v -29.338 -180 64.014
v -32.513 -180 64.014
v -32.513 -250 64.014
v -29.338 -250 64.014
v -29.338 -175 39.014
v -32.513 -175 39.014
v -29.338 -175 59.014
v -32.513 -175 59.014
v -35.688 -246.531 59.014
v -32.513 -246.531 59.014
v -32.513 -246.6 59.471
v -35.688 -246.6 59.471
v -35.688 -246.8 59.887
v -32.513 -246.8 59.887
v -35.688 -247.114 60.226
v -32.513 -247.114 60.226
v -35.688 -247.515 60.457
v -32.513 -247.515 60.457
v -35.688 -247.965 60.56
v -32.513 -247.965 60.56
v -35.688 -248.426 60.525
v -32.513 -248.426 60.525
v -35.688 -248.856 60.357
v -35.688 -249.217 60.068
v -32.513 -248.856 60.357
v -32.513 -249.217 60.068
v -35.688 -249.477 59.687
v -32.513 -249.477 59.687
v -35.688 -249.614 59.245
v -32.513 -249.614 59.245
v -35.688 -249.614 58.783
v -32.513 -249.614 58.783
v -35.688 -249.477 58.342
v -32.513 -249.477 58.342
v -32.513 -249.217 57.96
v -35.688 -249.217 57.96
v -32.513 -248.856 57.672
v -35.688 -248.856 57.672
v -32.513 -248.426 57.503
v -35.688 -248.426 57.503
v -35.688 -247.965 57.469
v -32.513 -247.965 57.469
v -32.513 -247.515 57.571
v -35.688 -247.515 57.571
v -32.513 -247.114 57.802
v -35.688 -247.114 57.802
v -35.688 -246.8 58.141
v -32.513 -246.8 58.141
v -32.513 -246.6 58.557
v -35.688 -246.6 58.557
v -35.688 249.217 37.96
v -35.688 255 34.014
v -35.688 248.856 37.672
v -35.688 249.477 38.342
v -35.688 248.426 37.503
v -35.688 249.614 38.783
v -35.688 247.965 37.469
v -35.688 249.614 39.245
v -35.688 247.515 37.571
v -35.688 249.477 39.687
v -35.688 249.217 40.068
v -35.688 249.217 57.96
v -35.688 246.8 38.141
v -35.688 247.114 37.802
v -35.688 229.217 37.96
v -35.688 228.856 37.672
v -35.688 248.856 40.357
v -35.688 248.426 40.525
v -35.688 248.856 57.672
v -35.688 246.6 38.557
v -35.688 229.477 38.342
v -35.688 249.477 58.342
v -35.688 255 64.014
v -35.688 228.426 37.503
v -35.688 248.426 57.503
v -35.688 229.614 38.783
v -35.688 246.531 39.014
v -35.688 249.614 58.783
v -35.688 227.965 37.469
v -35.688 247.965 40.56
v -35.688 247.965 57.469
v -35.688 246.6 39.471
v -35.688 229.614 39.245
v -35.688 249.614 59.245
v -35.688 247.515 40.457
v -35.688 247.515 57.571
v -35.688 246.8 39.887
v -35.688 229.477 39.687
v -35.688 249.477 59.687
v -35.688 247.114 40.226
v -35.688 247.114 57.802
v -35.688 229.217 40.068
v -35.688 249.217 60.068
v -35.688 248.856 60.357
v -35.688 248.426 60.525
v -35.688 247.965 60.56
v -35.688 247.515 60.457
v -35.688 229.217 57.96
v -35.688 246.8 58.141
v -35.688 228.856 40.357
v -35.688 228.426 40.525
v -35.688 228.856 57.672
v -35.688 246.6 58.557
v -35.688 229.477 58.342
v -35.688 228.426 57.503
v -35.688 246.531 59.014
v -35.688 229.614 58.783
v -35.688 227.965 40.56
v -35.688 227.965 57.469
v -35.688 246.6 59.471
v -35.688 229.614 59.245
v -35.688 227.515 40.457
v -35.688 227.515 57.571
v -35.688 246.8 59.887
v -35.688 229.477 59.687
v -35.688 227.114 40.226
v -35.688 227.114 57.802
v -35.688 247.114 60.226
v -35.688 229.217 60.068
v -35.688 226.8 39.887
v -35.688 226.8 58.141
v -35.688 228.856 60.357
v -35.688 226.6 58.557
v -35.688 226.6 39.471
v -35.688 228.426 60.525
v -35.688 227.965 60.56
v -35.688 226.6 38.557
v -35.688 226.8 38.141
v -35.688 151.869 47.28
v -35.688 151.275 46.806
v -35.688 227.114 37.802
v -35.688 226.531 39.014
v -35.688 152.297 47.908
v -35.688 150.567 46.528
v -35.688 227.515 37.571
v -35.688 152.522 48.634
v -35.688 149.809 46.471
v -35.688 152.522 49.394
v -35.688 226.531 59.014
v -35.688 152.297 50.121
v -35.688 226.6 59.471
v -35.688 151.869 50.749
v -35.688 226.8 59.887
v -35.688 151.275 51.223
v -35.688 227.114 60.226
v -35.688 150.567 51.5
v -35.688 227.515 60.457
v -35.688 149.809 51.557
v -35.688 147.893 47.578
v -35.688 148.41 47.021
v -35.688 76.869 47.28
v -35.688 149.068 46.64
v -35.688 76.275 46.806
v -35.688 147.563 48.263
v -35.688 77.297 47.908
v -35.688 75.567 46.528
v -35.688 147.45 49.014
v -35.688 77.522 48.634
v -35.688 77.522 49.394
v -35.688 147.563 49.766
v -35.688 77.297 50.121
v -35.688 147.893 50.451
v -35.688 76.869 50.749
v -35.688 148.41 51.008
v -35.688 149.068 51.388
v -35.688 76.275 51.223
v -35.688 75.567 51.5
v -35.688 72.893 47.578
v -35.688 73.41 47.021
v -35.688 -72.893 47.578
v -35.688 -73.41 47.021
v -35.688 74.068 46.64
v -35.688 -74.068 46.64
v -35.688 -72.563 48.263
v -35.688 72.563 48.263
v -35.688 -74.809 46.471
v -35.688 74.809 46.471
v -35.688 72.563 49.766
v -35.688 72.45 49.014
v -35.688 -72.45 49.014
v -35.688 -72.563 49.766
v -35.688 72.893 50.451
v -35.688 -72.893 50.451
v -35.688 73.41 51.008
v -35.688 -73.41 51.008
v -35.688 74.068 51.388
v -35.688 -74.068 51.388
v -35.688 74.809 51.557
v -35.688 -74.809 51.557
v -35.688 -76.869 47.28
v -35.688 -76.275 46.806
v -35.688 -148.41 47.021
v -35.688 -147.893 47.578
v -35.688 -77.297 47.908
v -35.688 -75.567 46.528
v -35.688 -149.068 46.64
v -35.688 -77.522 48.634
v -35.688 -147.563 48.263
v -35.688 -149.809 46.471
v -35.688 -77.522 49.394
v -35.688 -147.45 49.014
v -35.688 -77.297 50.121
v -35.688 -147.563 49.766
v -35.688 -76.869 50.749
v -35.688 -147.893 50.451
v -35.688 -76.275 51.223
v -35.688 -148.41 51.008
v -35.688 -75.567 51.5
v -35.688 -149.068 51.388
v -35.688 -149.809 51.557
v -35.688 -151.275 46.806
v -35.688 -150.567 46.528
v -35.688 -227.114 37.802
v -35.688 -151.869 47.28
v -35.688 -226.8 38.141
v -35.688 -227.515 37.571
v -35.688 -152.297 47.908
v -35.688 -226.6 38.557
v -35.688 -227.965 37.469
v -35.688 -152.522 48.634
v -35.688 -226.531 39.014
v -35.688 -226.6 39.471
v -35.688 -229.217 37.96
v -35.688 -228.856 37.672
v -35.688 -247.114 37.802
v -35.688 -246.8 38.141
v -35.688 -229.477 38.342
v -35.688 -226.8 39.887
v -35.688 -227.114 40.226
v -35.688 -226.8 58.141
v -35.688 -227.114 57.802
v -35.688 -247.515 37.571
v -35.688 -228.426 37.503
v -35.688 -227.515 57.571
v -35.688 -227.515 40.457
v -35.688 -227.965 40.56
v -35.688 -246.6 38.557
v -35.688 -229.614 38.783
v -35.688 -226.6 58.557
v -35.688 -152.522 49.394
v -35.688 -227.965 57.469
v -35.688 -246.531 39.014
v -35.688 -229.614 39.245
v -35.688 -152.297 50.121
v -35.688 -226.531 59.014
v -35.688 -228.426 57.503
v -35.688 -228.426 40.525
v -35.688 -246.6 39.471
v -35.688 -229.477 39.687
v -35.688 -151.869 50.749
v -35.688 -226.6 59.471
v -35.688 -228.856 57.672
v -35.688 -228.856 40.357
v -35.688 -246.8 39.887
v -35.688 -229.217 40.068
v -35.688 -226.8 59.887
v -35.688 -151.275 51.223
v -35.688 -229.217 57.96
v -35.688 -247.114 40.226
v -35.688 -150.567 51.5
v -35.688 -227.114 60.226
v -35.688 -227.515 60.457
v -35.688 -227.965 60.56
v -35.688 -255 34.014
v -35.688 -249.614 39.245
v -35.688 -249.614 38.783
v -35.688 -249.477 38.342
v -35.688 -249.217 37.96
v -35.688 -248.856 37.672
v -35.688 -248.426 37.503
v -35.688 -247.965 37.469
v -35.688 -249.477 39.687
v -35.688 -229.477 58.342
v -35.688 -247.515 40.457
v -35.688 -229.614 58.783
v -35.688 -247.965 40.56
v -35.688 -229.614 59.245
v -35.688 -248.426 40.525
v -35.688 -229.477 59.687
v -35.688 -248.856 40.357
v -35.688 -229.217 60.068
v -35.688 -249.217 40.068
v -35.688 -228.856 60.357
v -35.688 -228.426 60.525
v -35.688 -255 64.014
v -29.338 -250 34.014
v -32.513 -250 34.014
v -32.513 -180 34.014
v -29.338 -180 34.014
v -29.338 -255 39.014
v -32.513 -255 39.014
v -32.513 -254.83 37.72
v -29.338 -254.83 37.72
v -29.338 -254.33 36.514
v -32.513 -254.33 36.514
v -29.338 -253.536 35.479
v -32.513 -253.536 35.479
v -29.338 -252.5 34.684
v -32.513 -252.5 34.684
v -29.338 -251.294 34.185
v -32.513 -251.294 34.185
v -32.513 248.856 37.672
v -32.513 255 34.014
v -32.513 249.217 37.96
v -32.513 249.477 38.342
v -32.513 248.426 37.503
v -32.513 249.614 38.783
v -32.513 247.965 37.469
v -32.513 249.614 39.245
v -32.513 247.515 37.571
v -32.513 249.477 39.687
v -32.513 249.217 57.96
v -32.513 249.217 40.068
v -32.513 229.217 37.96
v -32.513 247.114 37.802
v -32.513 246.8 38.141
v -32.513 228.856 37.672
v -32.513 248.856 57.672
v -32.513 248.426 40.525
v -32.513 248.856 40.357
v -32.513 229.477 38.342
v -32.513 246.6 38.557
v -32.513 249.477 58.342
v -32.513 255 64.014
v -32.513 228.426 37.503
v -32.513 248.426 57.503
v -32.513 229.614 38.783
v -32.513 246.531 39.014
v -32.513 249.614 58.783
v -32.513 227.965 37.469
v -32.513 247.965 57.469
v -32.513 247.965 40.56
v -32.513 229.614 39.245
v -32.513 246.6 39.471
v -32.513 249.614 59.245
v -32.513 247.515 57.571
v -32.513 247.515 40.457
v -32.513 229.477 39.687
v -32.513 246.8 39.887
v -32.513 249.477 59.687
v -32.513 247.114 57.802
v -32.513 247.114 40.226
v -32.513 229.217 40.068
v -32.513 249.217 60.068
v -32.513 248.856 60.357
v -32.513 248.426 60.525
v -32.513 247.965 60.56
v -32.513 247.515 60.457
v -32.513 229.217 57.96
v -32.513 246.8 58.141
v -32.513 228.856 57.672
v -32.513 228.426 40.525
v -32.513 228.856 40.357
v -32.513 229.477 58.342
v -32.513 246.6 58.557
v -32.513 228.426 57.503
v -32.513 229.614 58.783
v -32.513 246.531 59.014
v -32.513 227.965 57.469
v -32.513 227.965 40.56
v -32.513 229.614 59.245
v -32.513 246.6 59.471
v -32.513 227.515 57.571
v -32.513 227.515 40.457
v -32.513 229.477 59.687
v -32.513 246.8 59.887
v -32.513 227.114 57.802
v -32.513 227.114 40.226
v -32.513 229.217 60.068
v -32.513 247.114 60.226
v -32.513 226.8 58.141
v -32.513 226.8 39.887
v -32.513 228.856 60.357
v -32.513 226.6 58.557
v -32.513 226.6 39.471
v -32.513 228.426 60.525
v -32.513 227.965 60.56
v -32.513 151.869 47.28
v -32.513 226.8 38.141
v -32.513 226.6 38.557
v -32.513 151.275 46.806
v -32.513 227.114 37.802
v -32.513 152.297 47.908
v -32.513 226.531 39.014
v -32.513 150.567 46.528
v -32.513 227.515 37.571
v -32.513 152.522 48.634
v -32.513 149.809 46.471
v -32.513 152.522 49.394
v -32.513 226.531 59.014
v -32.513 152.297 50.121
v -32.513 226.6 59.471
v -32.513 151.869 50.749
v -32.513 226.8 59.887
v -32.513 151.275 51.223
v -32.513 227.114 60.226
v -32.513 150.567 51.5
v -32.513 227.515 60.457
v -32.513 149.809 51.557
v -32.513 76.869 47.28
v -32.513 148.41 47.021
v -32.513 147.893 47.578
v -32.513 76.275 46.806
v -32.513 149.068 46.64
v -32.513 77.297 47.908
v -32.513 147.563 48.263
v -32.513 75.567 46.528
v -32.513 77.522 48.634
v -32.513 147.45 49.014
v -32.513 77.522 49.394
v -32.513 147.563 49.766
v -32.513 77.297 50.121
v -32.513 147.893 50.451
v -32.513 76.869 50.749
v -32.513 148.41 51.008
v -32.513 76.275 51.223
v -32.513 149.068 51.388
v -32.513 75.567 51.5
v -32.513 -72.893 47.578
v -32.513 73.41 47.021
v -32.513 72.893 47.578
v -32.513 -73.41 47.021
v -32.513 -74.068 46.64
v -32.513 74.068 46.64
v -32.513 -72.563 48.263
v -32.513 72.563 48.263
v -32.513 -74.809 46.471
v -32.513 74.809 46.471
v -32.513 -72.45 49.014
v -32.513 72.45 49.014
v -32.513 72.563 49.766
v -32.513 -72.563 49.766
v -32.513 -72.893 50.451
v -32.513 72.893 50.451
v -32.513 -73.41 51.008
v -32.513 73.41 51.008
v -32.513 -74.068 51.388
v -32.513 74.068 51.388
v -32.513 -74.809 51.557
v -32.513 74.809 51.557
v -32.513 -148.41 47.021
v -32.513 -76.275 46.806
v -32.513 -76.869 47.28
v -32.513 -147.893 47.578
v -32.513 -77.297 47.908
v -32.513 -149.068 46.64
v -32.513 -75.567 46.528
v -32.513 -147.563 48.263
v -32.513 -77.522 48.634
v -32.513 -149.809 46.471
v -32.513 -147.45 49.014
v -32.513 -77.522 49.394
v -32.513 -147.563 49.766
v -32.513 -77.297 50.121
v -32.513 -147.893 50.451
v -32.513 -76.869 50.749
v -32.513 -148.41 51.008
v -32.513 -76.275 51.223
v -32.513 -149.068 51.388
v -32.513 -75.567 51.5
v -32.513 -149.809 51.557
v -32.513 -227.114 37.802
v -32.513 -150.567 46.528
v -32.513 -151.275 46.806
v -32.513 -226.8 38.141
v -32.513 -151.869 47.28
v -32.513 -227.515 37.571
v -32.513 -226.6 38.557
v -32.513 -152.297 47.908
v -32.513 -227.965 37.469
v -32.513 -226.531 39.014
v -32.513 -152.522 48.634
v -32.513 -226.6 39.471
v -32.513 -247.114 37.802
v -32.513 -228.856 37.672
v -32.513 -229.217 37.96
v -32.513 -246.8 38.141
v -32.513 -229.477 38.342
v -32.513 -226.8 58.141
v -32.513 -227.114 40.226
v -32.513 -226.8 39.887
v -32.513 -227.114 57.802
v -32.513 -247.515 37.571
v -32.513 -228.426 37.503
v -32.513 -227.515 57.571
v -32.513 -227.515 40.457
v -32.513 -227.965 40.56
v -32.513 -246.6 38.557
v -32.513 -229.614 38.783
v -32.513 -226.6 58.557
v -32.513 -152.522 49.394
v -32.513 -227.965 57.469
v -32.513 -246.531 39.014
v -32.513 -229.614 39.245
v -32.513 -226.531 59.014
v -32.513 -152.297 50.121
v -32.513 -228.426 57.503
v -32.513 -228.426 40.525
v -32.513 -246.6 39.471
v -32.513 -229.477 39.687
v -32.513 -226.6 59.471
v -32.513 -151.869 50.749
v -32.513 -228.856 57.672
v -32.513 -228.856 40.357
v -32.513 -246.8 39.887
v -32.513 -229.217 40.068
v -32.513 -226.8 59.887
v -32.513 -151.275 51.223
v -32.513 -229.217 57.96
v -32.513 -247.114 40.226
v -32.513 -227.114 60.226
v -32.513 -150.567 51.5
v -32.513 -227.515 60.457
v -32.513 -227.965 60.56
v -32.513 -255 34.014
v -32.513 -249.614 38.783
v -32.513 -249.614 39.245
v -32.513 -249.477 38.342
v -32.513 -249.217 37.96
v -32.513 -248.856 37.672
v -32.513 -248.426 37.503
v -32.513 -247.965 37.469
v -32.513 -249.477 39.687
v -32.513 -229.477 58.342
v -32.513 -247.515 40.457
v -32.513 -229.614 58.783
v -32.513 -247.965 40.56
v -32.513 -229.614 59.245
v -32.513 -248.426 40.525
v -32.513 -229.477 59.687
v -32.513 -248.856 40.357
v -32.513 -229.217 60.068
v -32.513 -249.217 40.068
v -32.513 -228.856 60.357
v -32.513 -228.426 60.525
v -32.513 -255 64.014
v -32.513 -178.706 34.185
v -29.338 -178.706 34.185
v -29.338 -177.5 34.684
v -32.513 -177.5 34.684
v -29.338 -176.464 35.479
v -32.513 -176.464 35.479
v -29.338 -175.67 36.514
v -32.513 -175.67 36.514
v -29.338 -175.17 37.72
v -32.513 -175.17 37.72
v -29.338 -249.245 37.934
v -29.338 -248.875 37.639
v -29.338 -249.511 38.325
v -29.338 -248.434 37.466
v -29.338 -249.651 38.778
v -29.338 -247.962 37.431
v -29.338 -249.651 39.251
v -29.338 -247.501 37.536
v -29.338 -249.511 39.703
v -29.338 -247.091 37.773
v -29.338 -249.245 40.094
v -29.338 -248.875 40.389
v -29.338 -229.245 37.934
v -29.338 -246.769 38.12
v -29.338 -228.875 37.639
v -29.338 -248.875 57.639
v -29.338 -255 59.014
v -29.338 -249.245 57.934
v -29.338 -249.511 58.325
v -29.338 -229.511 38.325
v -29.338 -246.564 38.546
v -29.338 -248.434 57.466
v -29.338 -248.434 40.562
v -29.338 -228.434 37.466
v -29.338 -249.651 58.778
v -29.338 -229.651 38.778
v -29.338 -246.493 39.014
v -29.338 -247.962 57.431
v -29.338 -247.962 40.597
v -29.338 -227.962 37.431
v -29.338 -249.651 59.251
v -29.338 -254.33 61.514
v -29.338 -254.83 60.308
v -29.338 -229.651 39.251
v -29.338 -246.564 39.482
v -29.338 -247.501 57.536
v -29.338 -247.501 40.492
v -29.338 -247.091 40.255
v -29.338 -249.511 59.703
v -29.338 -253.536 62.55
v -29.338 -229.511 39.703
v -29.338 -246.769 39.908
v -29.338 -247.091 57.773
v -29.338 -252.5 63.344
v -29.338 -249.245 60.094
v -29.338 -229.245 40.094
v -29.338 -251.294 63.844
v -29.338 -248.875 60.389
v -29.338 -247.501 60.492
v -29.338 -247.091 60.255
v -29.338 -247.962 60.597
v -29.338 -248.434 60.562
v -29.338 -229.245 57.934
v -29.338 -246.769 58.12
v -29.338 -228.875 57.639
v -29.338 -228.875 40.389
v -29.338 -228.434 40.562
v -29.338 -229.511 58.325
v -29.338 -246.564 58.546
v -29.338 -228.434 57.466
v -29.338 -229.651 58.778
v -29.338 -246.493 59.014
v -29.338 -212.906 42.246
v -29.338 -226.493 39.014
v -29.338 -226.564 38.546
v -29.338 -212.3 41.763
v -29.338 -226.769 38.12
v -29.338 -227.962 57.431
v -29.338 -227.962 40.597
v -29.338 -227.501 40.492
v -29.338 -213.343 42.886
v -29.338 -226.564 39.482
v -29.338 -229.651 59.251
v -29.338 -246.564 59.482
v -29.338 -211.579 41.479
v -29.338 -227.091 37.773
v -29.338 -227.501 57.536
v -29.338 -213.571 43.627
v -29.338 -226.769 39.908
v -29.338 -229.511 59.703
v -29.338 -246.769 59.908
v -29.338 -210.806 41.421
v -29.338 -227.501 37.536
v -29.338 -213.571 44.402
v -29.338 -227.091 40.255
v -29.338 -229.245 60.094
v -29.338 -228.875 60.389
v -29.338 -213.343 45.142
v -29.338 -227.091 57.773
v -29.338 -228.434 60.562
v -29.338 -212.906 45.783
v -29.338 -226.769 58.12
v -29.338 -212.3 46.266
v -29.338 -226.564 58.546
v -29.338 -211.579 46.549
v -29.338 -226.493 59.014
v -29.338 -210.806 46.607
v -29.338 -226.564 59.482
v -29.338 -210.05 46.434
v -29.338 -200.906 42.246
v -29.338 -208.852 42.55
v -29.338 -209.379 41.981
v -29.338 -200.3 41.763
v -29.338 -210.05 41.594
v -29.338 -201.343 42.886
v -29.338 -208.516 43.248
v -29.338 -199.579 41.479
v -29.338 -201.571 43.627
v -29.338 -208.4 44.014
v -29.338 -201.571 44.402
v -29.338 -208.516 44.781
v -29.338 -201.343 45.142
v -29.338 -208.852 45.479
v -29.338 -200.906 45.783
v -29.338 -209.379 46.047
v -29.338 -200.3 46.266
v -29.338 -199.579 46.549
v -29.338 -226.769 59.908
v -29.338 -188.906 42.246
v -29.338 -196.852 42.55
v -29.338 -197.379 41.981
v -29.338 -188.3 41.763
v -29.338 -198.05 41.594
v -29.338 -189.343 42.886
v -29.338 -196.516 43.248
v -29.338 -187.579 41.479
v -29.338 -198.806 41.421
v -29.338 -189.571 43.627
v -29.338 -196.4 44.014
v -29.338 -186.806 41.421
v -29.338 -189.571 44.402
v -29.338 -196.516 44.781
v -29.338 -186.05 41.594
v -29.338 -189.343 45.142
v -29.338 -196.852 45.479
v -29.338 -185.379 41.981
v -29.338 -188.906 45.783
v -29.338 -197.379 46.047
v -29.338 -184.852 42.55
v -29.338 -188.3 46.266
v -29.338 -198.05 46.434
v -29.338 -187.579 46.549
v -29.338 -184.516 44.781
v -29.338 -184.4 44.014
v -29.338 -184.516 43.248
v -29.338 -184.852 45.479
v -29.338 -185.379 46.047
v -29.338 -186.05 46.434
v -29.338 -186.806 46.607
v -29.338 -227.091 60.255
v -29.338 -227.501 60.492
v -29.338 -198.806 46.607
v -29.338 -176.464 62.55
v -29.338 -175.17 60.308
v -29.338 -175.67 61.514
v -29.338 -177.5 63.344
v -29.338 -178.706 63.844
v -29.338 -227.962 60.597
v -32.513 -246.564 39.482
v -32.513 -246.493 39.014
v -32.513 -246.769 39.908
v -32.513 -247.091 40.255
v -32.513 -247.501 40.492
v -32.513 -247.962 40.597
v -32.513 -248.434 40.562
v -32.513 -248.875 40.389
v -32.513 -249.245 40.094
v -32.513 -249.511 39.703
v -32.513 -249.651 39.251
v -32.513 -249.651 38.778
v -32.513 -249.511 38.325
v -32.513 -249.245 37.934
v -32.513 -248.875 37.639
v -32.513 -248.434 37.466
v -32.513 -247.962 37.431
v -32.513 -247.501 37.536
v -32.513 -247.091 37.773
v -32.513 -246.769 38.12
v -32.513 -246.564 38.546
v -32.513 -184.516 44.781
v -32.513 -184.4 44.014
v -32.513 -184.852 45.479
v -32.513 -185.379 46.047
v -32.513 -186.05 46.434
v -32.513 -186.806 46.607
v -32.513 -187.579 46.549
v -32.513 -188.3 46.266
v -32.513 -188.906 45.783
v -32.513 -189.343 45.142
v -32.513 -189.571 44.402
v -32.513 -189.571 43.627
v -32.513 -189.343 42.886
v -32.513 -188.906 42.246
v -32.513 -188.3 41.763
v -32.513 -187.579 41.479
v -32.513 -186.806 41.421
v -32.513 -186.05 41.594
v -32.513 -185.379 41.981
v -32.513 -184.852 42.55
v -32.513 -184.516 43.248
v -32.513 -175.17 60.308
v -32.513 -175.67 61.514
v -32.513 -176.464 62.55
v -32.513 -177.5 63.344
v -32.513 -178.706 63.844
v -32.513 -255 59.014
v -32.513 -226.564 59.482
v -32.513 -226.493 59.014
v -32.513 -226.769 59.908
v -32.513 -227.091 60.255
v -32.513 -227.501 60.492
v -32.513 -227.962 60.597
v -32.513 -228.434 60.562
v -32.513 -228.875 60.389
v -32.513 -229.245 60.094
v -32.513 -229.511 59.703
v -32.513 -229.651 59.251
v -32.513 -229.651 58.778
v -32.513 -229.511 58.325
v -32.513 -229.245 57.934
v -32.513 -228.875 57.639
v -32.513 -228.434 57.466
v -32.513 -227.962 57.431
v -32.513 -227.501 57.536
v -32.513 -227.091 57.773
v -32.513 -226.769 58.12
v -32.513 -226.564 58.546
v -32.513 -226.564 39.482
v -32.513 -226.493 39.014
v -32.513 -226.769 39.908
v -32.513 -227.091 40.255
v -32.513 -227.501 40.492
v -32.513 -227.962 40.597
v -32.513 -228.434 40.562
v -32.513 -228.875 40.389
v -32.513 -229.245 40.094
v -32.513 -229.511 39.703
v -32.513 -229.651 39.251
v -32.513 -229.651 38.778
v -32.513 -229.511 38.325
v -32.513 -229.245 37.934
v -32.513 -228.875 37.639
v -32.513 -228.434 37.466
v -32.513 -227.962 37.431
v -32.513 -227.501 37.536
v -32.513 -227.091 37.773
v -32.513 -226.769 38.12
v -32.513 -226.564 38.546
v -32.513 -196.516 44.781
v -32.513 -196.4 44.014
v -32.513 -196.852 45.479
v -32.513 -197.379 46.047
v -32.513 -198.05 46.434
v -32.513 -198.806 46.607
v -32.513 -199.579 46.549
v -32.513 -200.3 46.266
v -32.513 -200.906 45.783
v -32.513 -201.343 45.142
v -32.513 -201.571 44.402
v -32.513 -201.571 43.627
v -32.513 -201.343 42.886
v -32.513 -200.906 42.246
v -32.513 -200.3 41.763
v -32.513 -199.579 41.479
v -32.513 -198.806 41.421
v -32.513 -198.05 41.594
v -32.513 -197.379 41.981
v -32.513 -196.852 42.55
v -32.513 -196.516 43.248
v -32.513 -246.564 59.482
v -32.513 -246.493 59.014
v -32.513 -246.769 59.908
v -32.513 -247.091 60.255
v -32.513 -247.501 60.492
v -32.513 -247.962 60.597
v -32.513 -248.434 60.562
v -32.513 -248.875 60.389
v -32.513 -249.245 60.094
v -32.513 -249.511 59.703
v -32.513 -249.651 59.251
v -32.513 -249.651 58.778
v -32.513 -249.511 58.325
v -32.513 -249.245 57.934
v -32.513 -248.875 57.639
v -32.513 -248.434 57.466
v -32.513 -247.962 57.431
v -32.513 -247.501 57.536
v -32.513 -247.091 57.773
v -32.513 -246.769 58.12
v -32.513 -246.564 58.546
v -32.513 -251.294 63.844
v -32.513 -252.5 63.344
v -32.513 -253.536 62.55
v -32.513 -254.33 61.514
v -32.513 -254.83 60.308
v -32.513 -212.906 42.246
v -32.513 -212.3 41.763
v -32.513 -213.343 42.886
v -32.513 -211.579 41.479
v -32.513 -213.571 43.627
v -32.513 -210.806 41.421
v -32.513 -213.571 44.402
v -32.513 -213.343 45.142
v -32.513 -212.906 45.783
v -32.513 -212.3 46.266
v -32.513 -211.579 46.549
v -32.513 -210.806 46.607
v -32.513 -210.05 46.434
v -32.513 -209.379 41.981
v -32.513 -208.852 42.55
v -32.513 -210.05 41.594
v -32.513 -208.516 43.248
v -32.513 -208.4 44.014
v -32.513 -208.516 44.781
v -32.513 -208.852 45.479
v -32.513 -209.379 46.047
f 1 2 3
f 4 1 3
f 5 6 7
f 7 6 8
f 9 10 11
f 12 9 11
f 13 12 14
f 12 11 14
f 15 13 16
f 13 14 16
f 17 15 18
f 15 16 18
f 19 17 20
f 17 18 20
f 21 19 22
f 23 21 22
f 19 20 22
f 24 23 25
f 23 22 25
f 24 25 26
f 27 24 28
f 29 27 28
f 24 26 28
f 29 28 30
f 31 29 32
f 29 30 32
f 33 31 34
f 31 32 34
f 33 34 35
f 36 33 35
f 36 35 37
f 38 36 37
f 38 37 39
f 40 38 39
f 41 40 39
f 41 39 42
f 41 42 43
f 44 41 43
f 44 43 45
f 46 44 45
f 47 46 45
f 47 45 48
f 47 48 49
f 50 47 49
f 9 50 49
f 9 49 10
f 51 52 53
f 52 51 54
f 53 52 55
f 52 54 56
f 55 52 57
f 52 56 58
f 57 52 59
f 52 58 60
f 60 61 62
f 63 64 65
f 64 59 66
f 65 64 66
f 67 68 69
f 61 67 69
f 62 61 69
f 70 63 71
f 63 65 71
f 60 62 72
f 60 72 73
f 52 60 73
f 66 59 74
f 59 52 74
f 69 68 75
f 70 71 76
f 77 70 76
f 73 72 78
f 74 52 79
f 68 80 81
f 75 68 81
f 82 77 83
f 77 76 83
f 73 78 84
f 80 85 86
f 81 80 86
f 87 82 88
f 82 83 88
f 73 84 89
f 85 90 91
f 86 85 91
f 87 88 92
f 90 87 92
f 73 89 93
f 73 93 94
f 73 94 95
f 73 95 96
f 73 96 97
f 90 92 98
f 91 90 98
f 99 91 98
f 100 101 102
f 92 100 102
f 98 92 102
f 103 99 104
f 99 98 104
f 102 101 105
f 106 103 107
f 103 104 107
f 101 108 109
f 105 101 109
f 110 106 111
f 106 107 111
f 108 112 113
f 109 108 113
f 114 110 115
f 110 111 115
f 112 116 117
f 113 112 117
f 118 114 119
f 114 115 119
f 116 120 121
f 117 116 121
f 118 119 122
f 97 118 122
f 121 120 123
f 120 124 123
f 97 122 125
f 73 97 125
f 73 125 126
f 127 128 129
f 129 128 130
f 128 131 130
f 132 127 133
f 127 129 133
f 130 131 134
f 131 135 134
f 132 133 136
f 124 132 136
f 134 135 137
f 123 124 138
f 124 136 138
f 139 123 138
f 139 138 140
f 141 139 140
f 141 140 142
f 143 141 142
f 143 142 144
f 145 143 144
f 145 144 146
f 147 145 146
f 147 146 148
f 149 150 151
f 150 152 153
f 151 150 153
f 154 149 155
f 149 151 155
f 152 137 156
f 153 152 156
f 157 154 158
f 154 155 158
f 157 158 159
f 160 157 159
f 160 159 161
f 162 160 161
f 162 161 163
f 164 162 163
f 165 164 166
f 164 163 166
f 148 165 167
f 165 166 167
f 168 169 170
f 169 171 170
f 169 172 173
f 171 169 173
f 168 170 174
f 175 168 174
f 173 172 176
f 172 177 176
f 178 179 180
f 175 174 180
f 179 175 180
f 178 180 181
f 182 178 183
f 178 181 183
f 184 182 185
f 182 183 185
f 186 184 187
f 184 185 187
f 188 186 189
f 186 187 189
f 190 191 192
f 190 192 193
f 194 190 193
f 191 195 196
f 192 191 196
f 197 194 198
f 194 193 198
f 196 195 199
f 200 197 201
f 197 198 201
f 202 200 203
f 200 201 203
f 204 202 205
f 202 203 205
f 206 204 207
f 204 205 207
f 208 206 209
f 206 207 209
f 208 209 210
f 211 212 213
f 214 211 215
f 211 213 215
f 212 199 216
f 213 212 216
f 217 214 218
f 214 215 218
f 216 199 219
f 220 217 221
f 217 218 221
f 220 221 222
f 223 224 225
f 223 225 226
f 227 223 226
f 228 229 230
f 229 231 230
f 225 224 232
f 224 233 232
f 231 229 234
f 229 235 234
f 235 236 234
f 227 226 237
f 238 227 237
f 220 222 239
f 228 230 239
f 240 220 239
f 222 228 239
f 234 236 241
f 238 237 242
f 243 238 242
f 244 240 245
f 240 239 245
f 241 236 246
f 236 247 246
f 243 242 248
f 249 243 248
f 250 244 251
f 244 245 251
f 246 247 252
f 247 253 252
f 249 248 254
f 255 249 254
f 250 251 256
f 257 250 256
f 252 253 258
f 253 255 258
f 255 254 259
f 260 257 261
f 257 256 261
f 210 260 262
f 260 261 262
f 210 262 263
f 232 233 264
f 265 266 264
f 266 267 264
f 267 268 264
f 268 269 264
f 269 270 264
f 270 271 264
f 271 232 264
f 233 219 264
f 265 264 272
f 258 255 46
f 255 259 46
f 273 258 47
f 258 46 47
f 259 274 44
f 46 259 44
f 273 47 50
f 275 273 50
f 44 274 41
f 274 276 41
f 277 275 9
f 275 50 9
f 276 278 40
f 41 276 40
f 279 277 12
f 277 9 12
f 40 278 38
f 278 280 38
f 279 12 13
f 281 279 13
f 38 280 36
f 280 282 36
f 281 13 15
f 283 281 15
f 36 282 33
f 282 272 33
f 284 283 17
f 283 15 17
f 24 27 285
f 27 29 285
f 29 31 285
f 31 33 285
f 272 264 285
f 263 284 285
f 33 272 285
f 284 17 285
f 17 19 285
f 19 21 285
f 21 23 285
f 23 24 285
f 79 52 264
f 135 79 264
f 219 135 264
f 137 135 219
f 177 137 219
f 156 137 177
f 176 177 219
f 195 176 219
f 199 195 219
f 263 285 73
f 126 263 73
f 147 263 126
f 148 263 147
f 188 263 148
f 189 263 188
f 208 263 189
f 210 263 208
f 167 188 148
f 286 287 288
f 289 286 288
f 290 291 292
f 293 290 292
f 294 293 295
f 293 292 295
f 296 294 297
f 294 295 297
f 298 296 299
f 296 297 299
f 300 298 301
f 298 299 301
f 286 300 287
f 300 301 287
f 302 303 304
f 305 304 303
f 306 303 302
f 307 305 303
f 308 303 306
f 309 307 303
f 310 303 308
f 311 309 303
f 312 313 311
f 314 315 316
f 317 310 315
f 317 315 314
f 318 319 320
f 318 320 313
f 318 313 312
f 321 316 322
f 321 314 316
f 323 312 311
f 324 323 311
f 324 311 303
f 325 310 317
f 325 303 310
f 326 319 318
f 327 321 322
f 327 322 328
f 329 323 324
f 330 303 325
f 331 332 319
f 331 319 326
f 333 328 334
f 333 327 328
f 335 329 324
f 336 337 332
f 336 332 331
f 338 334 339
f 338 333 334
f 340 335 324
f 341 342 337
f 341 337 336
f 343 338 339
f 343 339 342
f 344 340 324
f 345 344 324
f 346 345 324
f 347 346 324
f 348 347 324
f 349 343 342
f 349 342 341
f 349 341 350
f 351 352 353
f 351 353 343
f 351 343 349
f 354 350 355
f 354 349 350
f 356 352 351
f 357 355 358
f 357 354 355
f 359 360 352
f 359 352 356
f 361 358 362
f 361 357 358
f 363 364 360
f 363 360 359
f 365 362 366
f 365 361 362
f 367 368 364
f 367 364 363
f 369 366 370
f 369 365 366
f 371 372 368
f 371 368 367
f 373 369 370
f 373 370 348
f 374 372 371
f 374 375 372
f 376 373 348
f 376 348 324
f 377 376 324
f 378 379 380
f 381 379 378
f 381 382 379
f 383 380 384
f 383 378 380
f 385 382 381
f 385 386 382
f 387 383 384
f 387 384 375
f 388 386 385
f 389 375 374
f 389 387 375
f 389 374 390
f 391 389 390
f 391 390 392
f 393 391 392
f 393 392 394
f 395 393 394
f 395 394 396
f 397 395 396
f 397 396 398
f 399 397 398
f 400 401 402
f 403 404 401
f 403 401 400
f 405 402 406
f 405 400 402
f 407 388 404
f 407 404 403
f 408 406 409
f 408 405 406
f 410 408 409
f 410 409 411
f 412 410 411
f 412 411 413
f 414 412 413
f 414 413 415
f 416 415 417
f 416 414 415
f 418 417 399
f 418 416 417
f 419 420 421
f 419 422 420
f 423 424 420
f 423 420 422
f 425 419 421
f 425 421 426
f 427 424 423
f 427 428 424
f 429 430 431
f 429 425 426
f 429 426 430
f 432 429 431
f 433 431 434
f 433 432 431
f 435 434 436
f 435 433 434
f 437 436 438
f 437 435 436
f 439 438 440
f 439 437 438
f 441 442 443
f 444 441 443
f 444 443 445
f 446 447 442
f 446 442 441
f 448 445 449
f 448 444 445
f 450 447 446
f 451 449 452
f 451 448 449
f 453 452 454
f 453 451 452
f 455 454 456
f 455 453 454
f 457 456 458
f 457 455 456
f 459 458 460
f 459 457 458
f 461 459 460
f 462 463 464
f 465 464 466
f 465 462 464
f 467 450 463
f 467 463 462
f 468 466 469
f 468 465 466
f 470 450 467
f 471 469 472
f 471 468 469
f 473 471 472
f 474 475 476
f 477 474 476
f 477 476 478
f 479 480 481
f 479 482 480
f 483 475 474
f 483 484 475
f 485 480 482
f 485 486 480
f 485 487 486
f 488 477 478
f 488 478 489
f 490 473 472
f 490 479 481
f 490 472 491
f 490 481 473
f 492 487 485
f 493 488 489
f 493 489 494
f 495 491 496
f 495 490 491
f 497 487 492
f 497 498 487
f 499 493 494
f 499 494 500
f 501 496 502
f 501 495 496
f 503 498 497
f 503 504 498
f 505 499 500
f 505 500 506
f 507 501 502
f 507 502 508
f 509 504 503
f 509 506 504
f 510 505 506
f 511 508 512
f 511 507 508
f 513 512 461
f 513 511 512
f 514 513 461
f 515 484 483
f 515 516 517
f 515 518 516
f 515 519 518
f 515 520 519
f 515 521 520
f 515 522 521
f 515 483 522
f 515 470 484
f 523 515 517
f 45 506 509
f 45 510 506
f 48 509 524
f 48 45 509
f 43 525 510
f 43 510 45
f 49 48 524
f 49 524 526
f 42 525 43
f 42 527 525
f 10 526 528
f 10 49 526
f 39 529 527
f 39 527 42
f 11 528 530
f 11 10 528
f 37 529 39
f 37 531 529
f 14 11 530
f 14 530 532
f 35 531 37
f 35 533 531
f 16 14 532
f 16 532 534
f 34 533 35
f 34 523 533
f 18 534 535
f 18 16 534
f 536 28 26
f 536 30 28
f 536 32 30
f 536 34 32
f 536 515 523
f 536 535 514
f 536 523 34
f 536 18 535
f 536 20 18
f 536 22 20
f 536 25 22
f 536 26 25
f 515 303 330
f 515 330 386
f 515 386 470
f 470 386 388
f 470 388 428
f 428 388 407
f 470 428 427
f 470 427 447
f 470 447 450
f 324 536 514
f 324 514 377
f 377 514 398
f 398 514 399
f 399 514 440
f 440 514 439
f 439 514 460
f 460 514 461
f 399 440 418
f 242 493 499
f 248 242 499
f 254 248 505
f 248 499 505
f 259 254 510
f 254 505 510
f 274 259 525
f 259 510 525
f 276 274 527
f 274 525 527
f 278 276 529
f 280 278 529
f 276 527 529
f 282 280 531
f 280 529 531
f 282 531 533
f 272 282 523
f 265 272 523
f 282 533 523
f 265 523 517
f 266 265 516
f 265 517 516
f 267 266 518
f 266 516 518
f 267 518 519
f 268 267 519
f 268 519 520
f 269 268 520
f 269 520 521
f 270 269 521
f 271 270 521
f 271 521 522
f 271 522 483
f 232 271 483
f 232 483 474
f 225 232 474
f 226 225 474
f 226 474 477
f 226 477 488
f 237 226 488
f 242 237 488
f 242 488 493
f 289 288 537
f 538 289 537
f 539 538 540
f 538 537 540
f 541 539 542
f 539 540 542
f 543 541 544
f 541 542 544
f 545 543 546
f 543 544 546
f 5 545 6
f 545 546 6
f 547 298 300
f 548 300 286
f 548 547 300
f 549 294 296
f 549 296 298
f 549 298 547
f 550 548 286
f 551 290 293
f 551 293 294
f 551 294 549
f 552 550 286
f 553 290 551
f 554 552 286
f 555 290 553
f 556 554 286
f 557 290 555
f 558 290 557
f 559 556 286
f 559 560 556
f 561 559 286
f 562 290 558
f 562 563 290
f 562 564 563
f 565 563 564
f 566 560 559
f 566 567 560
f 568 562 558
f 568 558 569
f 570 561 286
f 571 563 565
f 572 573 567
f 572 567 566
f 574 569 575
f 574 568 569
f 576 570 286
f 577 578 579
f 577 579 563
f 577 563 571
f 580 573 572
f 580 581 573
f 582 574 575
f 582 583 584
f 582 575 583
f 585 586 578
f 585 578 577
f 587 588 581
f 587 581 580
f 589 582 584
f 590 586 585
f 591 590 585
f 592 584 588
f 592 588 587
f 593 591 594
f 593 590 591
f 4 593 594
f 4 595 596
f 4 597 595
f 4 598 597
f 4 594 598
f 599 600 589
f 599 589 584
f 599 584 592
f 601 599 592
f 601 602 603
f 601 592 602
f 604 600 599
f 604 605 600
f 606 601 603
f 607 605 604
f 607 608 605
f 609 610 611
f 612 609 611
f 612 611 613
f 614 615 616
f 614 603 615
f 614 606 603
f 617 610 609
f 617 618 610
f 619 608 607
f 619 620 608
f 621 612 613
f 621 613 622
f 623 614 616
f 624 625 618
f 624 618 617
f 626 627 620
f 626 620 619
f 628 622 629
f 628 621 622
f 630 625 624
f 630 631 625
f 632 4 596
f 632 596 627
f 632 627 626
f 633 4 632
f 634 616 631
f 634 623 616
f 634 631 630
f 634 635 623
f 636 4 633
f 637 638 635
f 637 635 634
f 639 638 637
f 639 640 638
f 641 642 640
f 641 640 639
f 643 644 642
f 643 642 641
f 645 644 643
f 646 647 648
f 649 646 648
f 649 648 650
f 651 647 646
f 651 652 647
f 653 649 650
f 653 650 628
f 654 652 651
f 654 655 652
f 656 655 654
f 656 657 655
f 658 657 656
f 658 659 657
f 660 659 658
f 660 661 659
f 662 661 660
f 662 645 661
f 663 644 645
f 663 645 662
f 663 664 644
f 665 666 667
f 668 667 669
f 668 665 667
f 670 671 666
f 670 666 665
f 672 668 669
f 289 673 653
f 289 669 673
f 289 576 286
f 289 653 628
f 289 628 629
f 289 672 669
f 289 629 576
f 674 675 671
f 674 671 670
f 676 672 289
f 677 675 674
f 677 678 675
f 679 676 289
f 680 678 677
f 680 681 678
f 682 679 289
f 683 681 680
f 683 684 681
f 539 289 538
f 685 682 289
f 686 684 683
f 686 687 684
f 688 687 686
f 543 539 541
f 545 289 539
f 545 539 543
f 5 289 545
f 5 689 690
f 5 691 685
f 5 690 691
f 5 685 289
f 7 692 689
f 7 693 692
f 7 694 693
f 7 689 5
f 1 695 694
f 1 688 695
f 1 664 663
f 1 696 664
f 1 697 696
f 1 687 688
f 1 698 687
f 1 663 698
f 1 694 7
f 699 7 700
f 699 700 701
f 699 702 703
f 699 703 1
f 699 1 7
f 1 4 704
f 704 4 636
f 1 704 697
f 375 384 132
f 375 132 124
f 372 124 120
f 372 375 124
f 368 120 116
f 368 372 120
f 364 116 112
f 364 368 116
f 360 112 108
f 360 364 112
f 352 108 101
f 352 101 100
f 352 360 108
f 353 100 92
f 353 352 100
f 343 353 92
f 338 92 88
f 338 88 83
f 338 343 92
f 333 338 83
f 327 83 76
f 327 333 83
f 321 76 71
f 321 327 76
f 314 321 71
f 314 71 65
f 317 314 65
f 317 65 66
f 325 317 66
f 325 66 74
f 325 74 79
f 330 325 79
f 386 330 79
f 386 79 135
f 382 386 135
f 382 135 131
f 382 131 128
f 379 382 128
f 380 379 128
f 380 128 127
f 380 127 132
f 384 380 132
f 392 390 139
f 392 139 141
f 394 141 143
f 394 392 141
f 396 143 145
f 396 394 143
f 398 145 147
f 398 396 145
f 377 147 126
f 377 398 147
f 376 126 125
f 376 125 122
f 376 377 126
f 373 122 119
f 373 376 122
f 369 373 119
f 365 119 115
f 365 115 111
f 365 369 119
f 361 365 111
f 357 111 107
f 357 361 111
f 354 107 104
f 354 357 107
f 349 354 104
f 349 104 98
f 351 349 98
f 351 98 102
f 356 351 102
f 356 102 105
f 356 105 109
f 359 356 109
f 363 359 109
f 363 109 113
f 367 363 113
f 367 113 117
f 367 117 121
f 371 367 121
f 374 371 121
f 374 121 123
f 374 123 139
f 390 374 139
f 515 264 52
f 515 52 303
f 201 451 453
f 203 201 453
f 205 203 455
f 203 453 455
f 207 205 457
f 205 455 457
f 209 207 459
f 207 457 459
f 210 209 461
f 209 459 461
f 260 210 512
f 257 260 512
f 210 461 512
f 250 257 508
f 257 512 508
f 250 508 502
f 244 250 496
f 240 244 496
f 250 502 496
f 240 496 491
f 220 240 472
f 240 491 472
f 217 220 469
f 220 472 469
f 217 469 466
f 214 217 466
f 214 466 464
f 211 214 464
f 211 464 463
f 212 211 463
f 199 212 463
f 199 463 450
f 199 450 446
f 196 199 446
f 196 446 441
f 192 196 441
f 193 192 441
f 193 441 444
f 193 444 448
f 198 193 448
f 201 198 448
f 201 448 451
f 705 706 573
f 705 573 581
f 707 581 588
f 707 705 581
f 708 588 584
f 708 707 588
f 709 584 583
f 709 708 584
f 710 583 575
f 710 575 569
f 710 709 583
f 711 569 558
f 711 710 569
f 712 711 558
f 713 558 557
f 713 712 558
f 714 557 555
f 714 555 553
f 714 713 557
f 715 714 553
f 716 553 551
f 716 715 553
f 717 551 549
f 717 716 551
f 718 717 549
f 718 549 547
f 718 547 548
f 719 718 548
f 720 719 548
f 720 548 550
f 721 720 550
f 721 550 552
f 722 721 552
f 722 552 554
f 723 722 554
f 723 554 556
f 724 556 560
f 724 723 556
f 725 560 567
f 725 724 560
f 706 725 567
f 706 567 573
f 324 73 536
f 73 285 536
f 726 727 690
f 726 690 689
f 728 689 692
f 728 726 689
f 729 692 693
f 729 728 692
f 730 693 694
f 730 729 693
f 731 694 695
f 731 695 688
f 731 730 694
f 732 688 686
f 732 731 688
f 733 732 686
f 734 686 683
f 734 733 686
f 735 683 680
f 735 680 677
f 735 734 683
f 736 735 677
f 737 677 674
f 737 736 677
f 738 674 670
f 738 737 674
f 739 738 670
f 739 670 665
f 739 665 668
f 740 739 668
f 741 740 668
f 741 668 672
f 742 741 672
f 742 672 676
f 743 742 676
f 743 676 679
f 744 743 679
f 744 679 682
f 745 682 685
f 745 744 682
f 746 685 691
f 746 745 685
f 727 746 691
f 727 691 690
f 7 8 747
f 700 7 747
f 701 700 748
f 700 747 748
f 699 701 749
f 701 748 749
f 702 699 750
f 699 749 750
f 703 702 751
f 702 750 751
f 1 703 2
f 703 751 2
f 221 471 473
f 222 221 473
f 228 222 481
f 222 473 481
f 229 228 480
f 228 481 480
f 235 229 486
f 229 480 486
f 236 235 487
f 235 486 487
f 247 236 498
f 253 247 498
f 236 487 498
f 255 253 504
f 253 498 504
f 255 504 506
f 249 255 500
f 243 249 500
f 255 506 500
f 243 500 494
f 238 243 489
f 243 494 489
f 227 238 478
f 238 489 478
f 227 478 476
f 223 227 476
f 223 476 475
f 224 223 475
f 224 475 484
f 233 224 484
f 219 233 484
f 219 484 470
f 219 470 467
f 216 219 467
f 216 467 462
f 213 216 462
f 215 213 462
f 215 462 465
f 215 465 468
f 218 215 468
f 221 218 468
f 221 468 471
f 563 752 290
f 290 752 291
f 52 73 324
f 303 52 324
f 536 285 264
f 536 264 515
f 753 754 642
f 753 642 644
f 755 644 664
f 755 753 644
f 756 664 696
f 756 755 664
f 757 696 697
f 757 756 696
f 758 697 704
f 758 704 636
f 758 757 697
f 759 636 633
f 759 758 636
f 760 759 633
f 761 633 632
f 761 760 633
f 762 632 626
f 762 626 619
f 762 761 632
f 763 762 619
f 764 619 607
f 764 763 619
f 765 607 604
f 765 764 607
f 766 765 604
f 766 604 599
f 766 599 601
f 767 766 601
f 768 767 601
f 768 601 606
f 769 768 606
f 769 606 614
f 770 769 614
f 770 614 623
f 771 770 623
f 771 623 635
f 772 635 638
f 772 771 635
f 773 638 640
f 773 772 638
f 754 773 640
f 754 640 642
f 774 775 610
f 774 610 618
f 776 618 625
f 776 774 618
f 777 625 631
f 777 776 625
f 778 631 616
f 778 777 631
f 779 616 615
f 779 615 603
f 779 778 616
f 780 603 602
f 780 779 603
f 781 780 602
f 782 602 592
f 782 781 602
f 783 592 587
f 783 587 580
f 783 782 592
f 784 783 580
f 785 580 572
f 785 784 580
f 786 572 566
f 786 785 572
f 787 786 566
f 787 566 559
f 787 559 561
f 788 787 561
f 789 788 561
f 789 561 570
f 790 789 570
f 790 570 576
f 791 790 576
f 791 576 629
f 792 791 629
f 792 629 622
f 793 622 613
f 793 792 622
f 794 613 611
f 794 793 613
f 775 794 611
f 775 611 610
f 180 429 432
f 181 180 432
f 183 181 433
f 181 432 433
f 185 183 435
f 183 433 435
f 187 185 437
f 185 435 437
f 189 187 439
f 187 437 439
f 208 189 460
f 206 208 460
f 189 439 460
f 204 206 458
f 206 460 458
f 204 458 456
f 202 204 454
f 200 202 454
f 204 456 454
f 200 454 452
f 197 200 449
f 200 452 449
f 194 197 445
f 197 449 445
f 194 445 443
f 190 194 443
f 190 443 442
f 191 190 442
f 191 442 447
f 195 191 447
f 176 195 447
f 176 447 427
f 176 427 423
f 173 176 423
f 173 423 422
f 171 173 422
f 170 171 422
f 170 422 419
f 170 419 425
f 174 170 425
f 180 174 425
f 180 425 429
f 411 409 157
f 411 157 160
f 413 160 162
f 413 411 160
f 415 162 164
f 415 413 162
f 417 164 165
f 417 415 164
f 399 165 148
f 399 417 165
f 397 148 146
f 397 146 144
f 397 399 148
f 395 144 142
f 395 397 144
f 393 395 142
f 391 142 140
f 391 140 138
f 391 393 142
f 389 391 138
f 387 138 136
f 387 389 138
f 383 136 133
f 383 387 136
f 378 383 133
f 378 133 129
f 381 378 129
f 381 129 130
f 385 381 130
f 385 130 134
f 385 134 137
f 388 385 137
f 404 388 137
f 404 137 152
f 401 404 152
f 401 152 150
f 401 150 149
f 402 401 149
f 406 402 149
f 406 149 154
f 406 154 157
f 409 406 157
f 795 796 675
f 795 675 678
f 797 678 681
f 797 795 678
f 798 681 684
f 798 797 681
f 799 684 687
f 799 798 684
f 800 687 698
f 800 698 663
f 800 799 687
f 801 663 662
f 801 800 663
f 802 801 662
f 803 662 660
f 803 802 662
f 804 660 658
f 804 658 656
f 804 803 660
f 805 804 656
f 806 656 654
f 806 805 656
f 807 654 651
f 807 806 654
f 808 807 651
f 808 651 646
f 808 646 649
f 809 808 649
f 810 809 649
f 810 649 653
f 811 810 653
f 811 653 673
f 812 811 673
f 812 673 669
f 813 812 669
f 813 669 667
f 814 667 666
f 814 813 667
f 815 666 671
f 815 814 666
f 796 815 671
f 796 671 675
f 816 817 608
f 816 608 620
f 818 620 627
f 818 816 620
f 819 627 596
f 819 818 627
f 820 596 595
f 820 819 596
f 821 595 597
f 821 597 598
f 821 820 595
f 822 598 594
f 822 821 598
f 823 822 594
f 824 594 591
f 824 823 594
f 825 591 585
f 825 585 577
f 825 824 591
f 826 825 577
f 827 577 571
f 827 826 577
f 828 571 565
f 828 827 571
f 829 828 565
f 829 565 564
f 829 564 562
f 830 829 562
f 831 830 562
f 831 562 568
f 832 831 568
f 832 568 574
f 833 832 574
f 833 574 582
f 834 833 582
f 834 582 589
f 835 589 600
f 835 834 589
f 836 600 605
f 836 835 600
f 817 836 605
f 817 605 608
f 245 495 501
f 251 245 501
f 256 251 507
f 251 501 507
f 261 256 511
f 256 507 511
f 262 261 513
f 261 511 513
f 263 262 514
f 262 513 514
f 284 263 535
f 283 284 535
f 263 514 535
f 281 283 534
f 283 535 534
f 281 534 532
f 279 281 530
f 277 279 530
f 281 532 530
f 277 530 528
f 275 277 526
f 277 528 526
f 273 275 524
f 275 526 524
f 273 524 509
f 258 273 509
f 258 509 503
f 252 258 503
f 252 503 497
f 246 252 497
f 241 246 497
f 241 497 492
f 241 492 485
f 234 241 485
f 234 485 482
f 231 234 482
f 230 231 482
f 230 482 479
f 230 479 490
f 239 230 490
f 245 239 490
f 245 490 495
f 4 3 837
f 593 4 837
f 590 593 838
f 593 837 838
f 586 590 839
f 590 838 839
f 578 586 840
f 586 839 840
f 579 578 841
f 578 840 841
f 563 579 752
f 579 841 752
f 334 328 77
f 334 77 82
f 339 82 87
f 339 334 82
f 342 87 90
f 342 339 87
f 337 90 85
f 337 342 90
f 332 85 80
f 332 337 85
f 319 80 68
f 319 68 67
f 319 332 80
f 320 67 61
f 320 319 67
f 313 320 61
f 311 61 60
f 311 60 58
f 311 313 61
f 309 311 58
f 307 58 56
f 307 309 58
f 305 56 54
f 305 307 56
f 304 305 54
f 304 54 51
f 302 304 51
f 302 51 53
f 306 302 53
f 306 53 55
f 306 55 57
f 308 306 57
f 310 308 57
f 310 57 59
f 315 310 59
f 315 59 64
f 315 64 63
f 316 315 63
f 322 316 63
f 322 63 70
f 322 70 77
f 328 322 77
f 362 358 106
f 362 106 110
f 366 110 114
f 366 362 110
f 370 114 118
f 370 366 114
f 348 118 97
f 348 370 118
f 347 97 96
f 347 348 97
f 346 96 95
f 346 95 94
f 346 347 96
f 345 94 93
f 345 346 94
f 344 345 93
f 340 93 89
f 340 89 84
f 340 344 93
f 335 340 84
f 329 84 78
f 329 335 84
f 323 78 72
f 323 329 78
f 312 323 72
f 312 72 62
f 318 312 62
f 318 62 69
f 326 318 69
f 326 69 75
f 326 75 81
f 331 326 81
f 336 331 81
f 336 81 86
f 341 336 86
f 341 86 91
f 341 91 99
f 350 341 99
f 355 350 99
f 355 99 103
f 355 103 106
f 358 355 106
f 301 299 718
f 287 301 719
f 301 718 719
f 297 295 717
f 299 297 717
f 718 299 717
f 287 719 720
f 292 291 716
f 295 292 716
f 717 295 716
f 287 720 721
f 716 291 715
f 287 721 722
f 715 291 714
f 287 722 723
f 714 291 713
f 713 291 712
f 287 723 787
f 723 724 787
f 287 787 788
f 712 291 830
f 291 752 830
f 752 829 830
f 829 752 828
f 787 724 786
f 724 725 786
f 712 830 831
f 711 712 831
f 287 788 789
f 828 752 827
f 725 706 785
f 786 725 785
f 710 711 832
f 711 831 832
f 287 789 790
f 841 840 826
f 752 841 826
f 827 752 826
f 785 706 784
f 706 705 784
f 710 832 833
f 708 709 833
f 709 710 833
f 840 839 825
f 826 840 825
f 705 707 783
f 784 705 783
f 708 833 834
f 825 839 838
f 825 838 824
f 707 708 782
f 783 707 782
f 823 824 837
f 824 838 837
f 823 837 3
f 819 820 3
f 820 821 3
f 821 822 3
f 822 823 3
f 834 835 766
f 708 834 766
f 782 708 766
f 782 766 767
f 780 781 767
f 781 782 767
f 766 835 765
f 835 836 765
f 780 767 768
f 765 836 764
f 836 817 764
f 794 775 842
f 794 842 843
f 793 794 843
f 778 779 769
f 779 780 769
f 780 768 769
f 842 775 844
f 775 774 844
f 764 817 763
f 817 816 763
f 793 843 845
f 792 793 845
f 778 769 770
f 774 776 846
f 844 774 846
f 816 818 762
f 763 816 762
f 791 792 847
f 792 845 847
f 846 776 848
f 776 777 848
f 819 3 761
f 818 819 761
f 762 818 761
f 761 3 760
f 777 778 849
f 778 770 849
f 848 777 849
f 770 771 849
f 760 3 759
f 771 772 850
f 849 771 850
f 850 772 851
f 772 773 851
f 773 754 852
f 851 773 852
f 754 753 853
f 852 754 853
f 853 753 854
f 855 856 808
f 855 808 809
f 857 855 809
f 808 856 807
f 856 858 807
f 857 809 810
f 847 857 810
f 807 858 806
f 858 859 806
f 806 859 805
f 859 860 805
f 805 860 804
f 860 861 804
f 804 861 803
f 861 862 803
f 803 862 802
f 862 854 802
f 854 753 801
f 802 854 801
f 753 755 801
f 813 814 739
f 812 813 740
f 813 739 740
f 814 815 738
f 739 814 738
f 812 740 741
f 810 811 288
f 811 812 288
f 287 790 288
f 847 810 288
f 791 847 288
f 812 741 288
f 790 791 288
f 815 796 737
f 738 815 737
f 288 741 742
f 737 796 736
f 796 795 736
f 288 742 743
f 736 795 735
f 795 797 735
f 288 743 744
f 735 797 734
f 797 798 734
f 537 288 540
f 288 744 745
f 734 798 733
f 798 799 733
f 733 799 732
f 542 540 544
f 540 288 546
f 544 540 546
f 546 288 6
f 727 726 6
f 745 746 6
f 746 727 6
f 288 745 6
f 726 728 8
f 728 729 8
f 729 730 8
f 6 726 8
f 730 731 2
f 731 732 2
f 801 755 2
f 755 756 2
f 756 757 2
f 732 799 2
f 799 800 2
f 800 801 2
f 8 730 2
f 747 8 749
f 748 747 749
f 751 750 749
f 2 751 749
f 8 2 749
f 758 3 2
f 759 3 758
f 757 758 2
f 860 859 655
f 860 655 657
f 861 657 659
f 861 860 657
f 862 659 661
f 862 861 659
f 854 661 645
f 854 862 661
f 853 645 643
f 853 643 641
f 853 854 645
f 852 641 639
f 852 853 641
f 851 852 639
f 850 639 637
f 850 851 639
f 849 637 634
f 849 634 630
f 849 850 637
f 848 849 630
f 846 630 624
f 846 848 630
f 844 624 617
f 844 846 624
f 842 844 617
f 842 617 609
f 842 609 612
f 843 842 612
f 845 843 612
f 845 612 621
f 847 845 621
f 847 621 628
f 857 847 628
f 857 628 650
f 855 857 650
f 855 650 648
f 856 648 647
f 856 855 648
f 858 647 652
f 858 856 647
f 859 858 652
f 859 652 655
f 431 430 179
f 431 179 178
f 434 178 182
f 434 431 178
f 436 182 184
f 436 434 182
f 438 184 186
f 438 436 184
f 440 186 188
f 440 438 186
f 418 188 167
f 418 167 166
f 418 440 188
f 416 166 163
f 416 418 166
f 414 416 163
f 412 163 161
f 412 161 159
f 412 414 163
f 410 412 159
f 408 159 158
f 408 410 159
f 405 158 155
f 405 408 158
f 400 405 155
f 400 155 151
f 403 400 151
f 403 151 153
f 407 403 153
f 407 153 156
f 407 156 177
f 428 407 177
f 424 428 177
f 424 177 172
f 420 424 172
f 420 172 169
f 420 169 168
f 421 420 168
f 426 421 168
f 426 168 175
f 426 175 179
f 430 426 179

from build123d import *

# Parameters (mm, degrees)
F0_W     = 3.175
F0_H     = 30
F1_DEPTH = 255
F2_R     = 1.55
F2_R_2   = 2.55
F3_DEPTH = 25
F5_R     = 1.5875
F5_R_2   = 2.6
F6_DEPTH = 3.175


with BuildPart() as f1:
    # F0 (on Front) → F1 (new body)
    with BuildSketch(Plane.XZ):
        with Locations((-34.100204, 49.014178)):
            Rectangle(F0_W, F0_H)
    extrude(amount=F1_DEPTH)

    # F2 (on face) → F3 (cut)
    with BuildSketch(Plane.YZ.offset(-32.512704)):
        with Locations((-248.080885, 59.014178)):
            Circle(F2_R)
        with Locations((-228.080885, 59.014178)):
            Circle(F2_R)
        with Locations((-228.080885, 39.014178)):
            Circle(F2_R)
        with Locations((-248.080885, 39.014178)):
            Circle(F2_R)
        with Locations((-150, 49.014178)):
            Circle(F2_R_2)
        with Locations((-75, 49.014178)):
            Circle(F2_R_2)
    extrude(amount=-F3_DEPTH, mode=Mode.SUBTRACT)

    # F4: F1 across face


with BuildPart() as f1_1:
    add(f1.part)
    add(f1.part.mirror(Plane(origin=(-34.100204, 0, 49.014178), x_dir=(1, 0, 0), z_dir=(0, 1, 0))))


with BuildPart() as f6:
    # F5 (on face) → F6 (new body)
    with BuildSketch(Plane.YZ.offset(-32.512704)):
        with BuildLine():
            Line((-180, 64.014178), (-250, 64.014178))
            ThreePointArc((-250, 64.014178), (-253.535534, 62.549712), (-255, 59.014178))
            Line((-255, 59.014178), (-255, 39.014178))
            ThreePointArc((-255, 39.014178), (-253.535534, 35.478644), (-250, 34.014178))
            Line((-250, 34.014178), (-180, 34.014178))
            ThreePointArc((-180, 34.014178), (-176.464466, 35.478644), (-175, 39.014178))
            Line((-175, 39.014178), (-175, 59.014178))
            ThreePointArc((-175, 59.014178), (-176.464466, 62.549712), (-180, 64.014178))
        make_face()
        with Locations((-248.080885, 39.014178)):
            Circle(F5_R, mode=Mode.SUBTRACT)
        with Locations((-228.080885, 39.014178)):
            Circle(F5_R, mode=Mode.SUBTRACT)
        with Locations((-211, 44.014178)):
            Circle(F5_R_2, mode=Mode.SUBTRACT)
        with Locations((-199, 44.014178)):
            Circle(F5_R_2, mode=Mode.SUBTRACT)
        with Locations((-187, 44.014178)):
            Circle(F5_R_2, mode=Mode.SUBTRACT)
        with Locations((-248.080885, 59.014178)):
            Circle(F5_R, mode=Mode.SUBTRACT)
        with Locations((-228.080885, 59.014178)):
            Circle(F5_R, mode=Mode.SUBTRACT)
    extrude(amount=F6_DEPTH)


solid = Compound([f1_1.part, f6.part])
